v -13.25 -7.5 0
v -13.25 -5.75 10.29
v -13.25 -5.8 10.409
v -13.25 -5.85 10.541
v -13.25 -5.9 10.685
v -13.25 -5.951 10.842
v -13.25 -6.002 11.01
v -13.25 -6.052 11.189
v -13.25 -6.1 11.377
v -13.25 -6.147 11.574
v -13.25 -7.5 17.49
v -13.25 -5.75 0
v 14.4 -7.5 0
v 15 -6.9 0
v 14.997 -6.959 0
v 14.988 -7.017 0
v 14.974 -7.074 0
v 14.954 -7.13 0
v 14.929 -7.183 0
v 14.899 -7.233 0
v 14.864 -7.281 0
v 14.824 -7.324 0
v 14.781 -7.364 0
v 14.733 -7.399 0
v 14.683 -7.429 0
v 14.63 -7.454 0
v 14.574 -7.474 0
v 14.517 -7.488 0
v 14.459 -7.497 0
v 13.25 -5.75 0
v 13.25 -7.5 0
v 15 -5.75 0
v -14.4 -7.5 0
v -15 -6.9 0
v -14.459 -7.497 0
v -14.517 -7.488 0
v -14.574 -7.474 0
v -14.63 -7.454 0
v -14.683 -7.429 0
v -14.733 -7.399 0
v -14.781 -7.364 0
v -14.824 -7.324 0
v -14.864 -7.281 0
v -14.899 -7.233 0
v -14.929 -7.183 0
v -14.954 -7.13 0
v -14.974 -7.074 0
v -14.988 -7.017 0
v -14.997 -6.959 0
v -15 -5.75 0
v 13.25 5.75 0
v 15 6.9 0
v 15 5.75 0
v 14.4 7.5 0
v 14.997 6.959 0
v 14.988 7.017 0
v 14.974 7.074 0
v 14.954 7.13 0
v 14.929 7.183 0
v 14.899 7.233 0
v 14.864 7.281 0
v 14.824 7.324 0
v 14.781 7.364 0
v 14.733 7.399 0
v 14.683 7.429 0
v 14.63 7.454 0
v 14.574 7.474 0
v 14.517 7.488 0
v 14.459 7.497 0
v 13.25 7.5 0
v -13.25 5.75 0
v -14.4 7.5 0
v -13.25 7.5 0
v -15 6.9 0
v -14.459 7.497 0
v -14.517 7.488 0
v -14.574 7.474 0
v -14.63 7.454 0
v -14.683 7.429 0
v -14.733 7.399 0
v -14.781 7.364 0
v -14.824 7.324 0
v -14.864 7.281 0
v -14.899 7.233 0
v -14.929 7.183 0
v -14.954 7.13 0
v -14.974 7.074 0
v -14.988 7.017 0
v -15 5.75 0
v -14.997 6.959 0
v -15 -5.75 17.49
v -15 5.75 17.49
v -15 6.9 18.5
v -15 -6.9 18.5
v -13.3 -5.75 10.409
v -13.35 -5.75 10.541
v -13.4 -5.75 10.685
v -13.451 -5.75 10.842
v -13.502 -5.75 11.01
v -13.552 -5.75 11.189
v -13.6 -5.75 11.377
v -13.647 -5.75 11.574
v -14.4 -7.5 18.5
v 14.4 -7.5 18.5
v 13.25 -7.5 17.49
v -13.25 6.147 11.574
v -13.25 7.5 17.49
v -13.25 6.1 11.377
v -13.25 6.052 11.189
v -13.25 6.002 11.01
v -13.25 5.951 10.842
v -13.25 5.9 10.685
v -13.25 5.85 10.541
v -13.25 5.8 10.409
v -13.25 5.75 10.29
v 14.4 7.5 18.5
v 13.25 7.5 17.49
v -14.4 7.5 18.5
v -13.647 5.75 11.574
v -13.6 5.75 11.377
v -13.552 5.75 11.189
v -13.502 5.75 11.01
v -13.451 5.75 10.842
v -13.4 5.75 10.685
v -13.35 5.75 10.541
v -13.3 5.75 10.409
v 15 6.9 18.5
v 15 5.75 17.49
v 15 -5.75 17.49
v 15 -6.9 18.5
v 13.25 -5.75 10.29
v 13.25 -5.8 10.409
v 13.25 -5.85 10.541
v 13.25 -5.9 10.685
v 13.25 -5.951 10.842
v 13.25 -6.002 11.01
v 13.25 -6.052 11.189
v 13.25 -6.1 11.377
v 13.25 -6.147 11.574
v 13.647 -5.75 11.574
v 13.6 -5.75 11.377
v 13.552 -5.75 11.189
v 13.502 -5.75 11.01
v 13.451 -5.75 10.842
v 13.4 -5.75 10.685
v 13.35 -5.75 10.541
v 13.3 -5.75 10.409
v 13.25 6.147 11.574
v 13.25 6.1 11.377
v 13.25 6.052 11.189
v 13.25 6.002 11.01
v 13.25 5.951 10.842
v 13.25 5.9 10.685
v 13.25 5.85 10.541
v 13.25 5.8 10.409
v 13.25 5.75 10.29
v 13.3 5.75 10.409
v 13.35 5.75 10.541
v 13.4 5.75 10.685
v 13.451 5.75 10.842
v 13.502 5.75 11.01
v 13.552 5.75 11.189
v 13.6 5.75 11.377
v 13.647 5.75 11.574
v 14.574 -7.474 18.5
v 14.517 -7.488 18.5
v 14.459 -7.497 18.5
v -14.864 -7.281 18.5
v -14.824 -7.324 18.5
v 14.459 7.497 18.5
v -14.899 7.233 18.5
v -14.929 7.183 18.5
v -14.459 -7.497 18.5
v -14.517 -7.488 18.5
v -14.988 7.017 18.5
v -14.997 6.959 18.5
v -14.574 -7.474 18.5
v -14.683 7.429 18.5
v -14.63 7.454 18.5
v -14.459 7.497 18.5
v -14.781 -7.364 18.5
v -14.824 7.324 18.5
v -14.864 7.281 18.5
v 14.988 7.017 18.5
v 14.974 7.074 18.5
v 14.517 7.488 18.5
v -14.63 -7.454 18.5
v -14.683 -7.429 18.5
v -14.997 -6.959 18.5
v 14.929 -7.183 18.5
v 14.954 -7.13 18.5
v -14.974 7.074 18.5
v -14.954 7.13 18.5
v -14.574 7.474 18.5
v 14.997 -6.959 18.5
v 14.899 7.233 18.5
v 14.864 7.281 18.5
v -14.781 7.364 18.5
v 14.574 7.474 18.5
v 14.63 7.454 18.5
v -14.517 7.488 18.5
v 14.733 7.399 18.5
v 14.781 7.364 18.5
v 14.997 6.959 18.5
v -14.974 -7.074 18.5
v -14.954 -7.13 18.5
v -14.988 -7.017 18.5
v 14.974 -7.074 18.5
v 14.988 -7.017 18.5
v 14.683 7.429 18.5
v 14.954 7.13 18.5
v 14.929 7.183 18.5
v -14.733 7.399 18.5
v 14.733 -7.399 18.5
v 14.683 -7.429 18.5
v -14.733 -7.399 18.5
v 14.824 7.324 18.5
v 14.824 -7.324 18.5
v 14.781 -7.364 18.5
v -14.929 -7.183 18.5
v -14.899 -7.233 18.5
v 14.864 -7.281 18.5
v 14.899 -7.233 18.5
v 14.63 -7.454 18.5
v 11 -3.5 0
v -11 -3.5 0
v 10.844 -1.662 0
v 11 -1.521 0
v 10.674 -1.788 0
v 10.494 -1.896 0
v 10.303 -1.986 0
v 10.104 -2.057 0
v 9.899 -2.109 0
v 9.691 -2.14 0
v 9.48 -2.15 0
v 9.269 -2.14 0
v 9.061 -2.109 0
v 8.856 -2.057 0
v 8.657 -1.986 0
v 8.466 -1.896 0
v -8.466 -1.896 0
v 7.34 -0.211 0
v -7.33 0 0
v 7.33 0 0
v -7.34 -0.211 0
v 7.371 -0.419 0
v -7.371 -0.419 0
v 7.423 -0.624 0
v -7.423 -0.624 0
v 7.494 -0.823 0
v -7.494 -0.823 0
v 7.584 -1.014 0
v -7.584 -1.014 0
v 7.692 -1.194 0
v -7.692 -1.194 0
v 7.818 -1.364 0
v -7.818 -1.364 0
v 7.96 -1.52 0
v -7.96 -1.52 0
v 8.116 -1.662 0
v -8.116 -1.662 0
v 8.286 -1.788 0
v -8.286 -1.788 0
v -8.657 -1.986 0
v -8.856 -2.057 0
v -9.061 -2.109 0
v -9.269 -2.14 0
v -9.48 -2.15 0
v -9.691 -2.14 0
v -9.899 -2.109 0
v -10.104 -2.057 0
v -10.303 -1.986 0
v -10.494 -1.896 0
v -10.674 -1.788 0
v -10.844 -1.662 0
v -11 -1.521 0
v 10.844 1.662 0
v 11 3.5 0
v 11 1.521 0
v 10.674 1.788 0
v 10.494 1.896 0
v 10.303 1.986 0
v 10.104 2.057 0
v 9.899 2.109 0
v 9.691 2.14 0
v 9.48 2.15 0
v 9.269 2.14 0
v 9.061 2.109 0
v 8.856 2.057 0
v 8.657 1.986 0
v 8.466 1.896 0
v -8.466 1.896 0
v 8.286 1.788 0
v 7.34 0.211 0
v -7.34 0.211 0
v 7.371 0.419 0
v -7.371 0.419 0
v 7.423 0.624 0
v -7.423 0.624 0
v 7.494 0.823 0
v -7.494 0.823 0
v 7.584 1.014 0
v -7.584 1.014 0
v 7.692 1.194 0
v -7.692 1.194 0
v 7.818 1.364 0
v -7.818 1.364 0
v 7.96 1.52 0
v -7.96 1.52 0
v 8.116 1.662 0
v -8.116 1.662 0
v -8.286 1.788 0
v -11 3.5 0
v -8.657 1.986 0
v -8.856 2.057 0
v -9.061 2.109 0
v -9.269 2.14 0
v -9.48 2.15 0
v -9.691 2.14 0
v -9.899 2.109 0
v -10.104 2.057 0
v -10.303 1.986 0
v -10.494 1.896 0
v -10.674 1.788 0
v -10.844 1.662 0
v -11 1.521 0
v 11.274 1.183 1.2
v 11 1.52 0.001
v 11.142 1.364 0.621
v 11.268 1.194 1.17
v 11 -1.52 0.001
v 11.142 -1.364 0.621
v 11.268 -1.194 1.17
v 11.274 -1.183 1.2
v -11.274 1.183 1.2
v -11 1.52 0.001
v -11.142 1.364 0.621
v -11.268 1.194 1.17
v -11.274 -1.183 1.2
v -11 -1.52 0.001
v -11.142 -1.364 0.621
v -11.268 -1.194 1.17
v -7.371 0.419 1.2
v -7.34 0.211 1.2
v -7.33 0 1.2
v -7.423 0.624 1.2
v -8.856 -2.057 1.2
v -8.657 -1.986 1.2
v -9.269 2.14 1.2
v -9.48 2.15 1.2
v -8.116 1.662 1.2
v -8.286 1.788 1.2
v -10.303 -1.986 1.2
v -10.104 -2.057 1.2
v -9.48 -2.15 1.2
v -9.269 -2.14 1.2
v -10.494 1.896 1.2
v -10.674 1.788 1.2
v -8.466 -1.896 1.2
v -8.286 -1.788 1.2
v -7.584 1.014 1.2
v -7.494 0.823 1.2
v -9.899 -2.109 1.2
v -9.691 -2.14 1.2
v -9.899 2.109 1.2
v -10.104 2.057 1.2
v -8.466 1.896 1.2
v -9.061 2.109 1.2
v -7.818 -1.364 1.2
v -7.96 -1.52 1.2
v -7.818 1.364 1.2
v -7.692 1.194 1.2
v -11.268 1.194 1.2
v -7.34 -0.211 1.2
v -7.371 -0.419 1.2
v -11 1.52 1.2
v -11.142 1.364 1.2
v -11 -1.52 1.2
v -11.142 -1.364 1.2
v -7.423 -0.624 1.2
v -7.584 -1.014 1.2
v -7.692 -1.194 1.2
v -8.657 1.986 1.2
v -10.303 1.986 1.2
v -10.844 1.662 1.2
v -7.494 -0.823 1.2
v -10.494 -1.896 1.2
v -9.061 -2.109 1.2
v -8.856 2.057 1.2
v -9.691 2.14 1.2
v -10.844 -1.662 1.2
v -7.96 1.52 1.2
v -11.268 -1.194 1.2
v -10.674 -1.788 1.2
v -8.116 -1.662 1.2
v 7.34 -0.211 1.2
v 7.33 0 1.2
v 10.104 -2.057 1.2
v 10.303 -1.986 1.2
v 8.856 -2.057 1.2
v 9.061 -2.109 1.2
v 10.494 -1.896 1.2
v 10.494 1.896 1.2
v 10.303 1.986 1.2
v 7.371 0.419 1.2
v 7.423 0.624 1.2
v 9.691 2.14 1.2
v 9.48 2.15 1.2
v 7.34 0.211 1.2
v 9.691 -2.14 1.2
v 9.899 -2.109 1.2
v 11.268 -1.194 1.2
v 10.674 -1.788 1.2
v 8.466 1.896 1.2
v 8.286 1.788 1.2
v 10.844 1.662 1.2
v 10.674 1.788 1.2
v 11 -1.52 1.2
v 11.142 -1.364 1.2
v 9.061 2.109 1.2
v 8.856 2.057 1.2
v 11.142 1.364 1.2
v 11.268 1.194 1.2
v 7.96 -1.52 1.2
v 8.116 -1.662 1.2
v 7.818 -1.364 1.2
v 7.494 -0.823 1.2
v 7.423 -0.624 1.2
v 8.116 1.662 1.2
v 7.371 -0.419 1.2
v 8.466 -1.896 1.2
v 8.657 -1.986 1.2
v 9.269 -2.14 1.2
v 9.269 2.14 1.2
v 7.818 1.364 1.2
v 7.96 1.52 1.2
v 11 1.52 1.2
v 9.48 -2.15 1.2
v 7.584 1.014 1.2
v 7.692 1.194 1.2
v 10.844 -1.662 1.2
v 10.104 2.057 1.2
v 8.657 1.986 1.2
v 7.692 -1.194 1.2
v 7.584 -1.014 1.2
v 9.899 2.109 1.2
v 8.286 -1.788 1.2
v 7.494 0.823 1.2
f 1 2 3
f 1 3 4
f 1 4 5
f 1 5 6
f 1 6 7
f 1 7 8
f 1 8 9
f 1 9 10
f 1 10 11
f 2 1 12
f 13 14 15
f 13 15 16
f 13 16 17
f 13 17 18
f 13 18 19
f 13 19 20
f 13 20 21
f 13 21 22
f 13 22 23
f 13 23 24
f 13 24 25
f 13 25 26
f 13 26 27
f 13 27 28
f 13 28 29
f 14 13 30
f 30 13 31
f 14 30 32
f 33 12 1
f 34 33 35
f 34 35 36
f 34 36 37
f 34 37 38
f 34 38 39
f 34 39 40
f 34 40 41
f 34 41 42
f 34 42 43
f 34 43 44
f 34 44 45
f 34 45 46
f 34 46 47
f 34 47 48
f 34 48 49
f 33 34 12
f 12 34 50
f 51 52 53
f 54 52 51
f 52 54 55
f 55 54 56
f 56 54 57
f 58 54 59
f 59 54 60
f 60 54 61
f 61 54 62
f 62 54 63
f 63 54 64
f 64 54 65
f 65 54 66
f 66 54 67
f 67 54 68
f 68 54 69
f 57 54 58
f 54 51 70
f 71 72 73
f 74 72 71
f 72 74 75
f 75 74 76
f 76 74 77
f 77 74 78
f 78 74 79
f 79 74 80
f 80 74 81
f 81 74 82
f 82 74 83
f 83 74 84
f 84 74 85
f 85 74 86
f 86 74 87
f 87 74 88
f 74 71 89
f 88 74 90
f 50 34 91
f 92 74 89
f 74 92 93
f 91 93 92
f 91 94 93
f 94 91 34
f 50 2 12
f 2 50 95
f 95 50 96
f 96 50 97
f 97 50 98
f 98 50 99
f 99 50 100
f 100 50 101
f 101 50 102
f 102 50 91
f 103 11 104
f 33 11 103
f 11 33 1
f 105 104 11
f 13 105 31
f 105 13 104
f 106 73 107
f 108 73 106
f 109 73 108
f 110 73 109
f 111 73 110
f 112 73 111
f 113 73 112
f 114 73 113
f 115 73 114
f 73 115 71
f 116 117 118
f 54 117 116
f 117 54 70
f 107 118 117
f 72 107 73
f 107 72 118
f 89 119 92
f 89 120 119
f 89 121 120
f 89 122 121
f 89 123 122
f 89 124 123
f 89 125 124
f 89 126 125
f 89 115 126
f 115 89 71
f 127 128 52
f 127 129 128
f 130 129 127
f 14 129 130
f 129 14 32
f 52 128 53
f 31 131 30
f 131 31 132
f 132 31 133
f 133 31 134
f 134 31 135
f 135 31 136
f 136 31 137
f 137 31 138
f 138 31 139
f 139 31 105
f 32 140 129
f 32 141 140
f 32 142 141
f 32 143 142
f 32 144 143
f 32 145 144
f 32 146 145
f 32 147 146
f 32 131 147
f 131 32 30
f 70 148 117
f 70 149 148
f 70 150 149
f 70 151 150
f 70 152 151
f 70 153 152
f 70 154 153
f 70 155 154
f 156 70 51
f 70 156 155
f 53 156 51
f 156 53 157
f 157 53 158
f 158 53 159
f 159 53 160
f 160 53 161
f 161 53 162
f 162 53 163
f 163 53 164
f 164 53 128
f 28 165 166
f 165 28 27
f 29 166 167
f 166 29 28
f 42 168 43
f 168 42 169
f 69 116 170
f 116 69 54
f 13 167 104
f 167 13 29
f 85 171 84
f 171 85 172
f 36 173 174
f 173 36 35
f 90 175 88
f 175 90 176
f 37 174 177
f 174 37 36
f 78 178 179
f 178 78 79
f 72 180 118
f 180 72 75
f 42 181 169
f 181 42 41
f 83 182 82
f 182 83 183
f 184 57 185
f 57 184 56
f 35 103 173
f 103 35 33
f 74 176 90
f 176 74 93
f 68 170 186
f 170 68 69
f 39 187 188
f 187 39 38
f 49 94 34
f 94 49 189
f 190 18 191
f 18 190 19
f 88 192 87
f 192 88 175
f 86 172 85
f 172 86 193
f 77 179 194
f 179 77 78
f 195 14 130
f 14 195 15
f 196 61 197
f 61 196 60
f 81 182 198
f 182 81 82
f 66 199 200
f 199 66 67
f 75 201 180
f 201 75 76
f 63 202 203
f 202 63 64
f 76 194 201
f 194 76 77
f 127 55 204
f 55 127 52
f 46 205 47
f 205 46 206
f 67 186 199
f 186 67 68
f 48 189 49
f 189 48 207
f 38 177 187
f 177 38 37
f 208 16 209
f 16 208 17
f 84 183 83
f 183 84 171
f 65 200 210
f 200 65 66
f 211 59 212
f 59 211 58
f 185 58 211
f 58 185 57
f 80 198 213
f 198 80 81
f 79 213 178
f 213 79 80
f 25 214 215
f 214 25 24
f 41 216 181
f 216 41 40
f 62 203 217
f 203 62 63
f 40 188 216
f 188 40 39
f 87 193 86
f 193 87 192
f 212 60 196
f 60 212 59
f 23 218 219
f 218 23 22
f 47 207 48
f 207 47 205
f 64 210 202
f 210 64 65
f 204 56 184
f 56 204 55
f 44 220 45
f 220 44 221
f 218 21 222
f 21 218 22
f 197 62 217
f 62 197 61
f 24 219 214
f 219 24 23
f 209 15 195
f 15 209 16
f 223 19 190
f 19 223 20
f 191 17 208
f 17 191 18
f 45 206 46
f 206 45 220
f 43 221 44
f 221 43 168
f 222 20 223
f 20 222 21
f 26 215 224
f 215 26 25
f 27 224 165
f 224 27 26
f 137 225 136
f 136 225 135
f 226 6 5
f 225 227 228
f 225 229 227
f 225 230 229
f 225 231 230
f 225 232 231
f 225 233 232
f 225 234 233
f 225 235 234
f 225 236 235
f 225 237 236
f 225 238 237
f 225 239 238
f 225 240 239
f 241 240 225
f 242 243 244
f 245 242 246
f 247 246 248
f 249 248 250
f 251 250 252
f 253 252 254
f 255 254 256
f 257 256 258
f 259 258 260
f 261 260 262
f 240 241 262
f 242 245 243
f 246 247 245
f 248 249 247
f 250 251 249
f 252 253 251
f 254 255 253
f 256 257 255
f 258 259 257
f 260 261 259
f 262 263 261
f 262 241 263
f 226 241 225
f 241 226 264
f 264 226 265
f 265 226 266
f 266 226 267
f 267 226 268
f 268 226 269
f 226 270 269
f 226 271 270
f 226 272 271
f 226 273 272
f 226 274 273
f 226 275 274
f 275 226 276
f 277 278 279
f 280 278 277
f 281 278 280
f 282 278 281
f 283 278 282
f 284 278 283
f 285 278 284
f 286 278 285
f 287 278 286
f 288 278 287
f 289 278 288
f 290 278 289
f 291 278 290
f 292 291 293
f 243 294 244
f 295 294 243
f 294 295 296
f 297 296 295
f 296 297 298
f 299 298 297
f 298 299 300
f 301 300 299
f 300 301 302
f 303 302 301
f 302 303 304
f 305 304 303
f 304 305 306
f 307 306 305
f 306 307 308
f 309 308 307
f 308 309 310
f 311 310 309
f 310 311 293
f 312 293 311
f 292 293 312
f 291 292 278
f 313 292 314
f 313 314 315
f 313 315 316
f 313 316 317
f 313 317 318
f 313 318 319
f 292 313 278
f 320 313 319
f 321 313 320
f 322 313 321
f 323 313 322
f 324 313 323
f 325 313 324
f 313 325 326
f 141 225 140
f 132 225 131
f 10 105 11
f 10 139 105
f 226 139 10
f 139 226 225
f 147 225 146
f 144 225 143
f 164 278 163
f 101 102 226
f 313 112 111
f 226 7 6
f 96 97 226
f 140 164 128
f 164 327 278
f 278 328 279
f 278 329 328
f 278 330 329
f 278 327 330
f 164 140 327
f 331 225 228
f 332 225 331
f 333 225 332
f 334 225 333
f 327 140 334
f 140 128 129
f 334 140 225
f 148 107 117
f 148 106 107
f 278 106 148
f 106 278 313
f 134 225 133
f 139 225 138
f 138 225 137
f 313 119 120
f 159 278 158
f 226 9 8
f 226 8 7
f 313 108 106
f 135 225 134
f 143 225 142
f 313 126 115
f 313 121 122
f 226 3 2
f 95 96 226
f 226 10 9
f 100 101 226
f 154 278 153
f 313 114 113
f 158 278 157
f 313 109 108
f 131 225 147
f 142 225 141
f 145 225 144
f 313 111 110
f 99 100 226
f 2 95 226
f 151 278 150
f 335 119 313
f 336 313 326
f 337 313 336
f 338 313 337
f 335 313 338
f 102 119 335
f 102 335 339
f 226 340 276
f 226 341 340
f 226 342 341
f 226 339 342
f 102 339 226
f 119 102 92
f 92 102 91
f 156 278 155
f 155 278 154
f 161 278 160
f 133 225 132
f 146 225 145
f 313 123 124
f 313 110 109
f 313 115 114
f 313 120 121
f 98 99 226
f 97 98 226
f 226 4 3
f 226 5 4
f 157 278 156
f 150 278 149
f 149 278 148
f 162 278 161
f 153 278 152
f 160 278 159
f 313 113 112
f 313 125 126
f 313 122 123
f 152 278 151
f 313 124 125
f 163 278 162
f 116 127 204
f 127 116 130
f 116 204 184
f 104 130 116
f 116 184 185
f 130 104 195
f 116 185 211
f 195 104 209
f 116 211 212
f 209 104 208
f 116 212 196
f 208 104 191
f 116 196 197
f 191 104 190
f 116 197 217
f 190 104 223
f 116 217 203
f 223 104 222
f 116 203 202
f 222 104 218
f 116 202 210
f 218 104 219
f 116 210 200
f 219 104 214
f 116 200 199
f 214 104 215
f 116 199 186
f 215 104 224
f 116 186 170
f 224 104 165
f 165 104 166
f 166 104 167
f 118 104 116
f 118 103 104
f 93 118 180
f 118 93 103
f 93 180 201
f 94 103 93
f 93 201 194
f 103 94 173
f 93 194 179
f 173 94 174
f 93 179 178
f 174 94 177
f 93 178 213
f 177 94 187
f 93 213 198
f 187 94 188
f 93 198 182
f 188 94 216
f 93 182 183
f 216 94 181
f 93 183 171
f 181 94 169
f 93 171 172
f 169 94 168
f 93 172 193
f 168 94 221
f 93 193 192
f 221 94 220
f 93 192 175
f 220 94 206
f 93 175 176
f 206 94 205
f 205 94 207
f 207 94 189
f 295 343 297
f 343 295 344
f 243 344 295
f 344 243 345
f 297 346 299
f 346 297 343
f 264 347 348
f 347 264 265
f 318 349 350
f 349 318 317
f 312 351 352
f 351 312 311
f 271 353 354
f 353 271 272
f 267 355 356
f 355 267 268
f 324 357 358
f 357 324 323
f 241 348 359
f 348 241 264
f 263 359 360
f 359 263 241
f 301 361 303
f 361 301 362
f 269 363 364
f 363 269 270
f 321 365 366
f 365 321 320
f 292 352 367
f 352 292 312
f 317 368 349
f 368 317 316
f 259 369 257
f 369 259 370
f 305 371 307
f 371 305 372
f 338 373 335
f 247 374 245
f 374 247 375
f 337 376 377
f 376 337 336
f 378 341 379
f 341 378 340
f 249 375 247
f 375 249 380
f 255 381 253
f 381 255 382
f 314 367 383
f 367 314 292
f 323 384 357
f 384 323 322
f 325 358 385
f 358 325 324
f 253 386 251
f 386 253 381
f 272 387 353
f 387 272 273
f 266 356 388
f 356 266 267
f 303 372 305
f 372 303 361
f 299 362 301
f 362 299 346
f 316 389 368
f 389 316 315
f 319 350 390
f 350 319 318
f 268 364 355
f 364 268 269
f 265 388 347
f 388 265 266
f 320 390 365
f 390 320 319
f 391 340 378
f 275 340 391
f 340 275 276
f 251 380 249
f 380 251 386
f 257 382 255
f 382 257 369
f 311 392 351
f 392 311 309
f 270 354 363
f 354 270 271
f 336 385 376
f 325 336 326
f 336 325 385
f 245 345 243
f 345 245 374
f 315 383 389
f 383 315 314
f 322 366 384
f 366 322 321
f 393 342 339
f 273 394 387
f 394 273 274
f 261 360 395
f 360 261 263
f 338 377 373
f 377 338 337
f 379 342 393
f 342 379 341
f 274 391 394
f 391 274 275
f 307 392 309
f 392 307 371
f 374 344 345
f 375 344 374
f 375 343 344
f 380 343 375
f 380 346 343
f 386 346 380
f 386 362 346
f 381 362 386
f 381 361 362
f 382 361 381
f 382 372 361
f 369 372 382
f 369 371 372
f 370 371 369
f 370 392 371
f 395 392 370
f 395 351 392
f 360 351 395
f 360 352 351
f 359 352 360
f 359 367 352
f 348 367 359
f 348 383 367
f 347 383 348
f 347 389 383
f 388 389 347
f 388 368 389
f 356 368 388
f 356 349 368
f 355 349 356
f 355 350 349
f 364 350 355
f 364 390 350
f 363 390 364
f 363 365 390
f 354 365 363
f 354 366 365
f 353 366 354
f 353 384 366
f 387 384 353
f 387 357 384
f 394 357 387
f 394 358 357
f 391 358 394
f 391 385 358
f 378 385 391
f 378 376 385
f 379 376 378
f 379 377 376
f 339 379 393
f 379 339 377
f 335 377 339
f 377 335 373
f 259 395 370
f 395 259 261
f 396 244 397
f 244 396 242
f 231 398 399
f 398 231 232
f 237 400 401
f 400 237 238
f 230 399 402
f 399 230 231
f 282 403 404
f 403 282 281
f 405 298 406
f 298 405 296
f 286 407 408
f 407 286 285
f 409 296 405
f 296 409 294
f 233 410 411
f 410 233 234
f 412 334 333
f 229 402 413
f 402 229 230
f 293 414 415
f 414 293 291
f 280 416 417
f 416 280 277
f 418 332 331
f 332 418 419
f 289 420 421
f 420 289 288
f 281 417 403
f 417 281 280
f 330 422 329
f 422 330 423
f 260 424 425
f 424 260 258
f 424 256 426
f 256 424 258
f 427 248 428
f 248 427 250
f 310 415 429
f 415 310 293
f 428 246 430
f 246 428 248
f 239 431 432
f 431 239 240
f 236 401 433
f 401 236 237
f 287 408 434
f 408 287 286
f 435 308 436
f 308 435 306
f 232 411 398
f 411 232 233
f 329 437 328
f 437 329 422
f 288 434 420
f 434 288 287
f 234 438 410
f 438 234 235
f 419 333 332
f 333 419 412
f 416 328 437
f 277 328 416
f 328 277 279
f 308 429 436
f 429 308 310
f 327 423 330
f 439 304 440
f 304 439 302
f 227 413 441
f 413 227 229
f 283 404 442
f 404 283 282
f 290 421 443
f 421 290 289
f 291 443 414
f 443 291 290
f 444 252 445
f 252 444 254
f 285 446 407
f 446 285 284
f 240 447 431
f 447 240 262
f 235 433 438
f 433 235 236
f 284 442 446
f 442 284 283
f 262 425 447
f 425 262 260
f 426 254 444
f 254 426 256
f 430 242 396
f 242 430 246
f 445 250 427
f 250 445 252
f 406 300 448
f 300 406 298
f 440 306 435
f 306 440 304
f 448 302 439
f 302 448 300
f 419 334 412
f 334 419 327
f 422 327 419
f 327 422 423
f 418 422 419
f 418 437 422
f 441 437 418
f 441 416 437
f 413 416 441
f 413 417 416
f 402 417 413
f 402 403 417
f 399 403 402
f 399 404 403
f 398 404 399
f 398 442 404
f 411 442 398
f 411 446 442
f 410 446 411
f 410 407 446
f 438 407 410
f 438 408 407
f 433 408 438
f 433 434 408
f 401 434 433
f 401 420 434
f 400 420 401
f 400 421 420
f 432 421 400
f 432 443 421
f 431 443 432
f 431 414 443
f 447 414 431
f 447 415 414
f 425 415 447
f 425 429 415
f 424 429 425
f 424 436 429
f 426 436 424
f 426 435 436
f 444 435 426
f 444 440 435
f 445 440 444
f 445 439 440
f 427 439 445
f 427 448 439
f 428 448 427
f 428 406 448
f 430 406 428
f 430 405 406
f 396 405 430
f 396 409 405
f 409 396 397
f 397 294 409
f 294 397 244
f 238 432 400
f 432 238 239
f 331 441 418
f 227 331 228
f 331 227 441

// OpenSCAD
// office / desk — a desk token, built like table.scad and console.scad: a thin
// top slab standing proud of a set-back body on four corner legs, kept as one
// solid, support-free block. No place_setting is engraved — that symbol reads
// as a dining table, and a desk is worked at, not eaten at.
//
// Width/Depth are the real-world top in cm: a single 120 x 60 writing desk (a
// 160 x 80 double-width variant is the same part, just override both). Height is
// the real height of the top — desk height, a touch under a dining table — shrunk
// by the plan scale like the footprint (see printed_h() in lib/common.scad), same
// as table.scad.

include <../lib/common.scad>

Width  = 120;  // cm — a 160x80 variant is the same part, wider and deeper
Depth  = 60;   // cm
Height = 74;   // cm — desk height

// the printed height, mm: Height at the plan scale
Print_h = printed_h(Height);

// The top slab, in real cm — the only part of the token at full footprint, so its
// edge is the line you read the size off. Same idea as table.scad.
Top_h = 4;
// How far the body under the top is set back from the edge, in real cm.
// Clamped below exactly like table.scad/console.scad: it may not lean past 45
// deg (body_h) and must leave a base wide enough for a magnet pocket.
Setback = 16;
// A leg at each corner, flush with the edge of the top, so the corners read
// solid while the body slopes away between them (see table.scad).
Show_legs = true;
Leg       = 7;   // cm

// A shallow seam hinting at a drawer pedestal under one end of the top,
// instead of the full drawers() symbol — a desk pedestal reads as one seam,
// not a row of fronts. It sits Pedestal_w in from the +X end (the right-hand
// return as you face the desk from the front, -Y), leaving the rest of the
// top open for a kneehole. Off by default so a plain writing desk / trestle
// stays plain.
Show_drawers = false;
Pedestal_w   = 40;  // cm, width of the pedestal from the +X end
Pedestal_gap = 3;   // cm kept clear from the front/back edges
Seam_w       = 2;   // cm, thickness of the seam line — ~0.5 mm printed

// Magnet pockets in the bottom face, in a row along the width (0 = none). Two
// keep the piece from pivoting; see Magnet_* in lib/common.scad. At 60 cm
// depth (15 mm at 1:40) the 4 mm disc fits fine.
Magnets = 2;

desk();

module desk() {
    body_h = Print_h - rise(Top_h);
    // Same clamp as table.scad/console.scad: never lean past 45 deg, and
    // always leave a base wide enough to stand on and take a magnet pocket.
    base_min = magnet_min_span(magnet_d_for(Width, Depth));
    back = max(0, min(cm(Setback), body_h,
                       (min(cm(Width), cm(Depth)) - base_min) / 2));
    difference() {
        union() {
            // the body: full footprint where it meets the top, set back at the floor
            hull() {
                linear_extrude(height = 0.01)
                    offset(delta = -back) footprint_2d(Width, Depth);
                translate([0, 0, body_h - 0.01])
                    linear_extrude(height = 0.01) footprint_2d(Width, Depth);
            }
            if (Show_legs) legs(body_h);
            translate([0, 0, body_h])
                linear_extrude(height = rise(Top_h)) footprint_2d(Width, Depth);
        }
        if (Show_drawers)
            groove(Width / 2 - Pedestal_w, 0, Seam_w,
                   Depth - 2 * Pedestal_gap, Print_h);
        if (Magnets > 0)
            magnets(Width, Depth, Magnets);
    }
}

// Legs, <h> mm tall, clipped to the outline so a rounded corner stays rounded —
// same technique as table.scad's legs(), rectangular only (a desk has no round
// variant).
module legs(h) {
    intersection() {
        linear_extrude(height = h) footprint_2d(Width, Depth);
        for (x = [-1, 1], y = [-1, 1])
            translate([x * (cm(Width) - cm(Leg)) / 2,
                       y * (cm(Depth) - cm(Leg)) / 2, h / 2])
                cube([cm(Leg), cm(Leg), h], center = true);
    }
}
